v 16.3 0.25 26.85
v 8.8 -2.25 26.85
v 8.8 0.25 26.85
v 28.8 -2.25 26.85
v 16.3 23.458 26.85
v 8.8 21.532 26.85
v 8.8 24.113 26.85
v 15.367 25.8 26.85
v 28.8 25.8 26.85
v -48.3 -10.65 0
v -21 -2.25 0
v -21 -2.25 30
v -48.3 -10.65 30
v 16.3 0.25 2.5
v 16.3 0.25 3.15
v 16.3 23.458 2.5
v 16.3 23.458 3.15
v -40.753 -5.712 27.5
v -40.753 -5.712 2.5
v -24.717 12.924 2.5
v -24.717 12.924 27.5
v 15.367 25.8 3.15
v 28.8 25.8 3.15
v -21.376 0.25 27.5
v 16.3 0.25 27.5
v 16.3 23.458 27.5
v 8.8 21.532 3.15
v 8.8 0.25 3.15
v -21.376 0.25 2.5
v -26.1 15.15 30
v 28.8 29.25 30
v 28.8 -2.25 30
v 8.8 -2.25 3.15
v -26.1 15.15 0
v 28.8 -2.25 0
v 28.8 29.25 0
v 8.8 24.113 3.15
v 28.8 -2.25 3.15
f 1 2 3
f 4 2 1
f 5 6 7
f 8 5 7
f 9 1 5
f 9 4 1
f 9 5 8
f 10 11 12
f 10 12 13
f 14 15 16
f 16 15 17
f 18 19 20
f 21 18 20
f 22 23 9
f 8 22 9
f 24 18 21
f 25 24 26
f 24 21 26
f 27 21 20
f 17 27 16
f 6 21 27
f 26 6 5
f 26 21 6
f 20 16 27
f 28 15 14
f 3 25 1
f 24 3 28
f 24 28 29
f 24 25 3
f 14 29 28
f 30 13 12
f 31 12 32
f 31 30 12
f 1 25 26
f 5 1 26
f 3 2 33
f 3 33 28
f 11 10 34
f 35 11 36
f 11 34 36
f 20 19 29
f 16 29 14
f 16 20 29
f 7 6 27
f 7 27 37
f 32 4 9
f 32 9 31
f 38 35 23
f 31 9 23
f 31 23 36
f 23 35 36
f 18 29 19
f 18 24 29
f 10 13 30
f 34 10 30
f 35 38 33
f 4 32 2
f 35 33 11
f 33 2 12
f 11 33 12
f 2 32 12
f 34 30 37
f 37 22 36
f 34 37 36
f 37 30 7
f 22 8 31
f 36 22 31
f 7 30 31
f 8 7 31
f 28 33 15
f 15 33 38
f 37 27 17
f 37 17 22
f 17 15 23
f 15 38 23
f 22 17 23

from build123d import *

# Parameters (mm, degrees)
F0_W     = 77.1000012755
F0_H     = 39.9000020698
F1_DEPTH = 30
F3_DEPTH = 30.001
F4_W     = 28.0499991495
F4_H     = 23.7000000197
F5_DEPTH = 10
F6_T     = -2.5
F7_DEPTH = 10


with BuildPart() as f1:
    # F0 (on Top) → F1 (new body)
    with BuildSketch(Plane.XY):
        with Locations((-9.7500011325, 9.3000004999)):
            Rectangle(F0_W, F0_H)
    extrude(amount=F1_DEPTH)

    # F2 (on face) → F3 (cut, through all)
    with BuildSketch(Plane.XY.offset(30)):
        Polygon((-48.3000017703, 29.2500015348), (-48.3000017703, -10.650000535), (-26.1000003666, 15.1500003412), (28.7999995053, 29.2500015348), align=None)
        Polygon((-21.0000015795, -2.250000136), (-48.3000017703, -10.650000535), (28.7999995053, -10.650000535), (28.7999995053, -2.250000136), align=None)
    extrude(amount=-F3_DEPTH, mode=Mode.SUBTRACT)

    # F4 (on face) → F5 (cut)
    with BuildSketch(Plane.YZ.offset(28.7999995053)):
        with Locations((11.7749994388, 15.000000014)):
            Rectangle(F4_W, F4_H)
    extrude(amount=-F5_DEPTH, mode=Mode.SUBTRACT)

    # F6 (hollow: no face is removed)
    offset(amount=F6_T, kind=Kind.INTERSECTION, mode=Mode.SUBTRACT)

    # F7 (cut): a face of the model
    f7_faces = [f1.faces().sort_by_distance(p)[0] for p in [
        (18.7999995053, 11.7749994388, 15.000000014),
    ]]
    extrude(f7_faces, amount=-F7_DEPTH, mode=Mode.SUBTRACT)


solid = f1.part
